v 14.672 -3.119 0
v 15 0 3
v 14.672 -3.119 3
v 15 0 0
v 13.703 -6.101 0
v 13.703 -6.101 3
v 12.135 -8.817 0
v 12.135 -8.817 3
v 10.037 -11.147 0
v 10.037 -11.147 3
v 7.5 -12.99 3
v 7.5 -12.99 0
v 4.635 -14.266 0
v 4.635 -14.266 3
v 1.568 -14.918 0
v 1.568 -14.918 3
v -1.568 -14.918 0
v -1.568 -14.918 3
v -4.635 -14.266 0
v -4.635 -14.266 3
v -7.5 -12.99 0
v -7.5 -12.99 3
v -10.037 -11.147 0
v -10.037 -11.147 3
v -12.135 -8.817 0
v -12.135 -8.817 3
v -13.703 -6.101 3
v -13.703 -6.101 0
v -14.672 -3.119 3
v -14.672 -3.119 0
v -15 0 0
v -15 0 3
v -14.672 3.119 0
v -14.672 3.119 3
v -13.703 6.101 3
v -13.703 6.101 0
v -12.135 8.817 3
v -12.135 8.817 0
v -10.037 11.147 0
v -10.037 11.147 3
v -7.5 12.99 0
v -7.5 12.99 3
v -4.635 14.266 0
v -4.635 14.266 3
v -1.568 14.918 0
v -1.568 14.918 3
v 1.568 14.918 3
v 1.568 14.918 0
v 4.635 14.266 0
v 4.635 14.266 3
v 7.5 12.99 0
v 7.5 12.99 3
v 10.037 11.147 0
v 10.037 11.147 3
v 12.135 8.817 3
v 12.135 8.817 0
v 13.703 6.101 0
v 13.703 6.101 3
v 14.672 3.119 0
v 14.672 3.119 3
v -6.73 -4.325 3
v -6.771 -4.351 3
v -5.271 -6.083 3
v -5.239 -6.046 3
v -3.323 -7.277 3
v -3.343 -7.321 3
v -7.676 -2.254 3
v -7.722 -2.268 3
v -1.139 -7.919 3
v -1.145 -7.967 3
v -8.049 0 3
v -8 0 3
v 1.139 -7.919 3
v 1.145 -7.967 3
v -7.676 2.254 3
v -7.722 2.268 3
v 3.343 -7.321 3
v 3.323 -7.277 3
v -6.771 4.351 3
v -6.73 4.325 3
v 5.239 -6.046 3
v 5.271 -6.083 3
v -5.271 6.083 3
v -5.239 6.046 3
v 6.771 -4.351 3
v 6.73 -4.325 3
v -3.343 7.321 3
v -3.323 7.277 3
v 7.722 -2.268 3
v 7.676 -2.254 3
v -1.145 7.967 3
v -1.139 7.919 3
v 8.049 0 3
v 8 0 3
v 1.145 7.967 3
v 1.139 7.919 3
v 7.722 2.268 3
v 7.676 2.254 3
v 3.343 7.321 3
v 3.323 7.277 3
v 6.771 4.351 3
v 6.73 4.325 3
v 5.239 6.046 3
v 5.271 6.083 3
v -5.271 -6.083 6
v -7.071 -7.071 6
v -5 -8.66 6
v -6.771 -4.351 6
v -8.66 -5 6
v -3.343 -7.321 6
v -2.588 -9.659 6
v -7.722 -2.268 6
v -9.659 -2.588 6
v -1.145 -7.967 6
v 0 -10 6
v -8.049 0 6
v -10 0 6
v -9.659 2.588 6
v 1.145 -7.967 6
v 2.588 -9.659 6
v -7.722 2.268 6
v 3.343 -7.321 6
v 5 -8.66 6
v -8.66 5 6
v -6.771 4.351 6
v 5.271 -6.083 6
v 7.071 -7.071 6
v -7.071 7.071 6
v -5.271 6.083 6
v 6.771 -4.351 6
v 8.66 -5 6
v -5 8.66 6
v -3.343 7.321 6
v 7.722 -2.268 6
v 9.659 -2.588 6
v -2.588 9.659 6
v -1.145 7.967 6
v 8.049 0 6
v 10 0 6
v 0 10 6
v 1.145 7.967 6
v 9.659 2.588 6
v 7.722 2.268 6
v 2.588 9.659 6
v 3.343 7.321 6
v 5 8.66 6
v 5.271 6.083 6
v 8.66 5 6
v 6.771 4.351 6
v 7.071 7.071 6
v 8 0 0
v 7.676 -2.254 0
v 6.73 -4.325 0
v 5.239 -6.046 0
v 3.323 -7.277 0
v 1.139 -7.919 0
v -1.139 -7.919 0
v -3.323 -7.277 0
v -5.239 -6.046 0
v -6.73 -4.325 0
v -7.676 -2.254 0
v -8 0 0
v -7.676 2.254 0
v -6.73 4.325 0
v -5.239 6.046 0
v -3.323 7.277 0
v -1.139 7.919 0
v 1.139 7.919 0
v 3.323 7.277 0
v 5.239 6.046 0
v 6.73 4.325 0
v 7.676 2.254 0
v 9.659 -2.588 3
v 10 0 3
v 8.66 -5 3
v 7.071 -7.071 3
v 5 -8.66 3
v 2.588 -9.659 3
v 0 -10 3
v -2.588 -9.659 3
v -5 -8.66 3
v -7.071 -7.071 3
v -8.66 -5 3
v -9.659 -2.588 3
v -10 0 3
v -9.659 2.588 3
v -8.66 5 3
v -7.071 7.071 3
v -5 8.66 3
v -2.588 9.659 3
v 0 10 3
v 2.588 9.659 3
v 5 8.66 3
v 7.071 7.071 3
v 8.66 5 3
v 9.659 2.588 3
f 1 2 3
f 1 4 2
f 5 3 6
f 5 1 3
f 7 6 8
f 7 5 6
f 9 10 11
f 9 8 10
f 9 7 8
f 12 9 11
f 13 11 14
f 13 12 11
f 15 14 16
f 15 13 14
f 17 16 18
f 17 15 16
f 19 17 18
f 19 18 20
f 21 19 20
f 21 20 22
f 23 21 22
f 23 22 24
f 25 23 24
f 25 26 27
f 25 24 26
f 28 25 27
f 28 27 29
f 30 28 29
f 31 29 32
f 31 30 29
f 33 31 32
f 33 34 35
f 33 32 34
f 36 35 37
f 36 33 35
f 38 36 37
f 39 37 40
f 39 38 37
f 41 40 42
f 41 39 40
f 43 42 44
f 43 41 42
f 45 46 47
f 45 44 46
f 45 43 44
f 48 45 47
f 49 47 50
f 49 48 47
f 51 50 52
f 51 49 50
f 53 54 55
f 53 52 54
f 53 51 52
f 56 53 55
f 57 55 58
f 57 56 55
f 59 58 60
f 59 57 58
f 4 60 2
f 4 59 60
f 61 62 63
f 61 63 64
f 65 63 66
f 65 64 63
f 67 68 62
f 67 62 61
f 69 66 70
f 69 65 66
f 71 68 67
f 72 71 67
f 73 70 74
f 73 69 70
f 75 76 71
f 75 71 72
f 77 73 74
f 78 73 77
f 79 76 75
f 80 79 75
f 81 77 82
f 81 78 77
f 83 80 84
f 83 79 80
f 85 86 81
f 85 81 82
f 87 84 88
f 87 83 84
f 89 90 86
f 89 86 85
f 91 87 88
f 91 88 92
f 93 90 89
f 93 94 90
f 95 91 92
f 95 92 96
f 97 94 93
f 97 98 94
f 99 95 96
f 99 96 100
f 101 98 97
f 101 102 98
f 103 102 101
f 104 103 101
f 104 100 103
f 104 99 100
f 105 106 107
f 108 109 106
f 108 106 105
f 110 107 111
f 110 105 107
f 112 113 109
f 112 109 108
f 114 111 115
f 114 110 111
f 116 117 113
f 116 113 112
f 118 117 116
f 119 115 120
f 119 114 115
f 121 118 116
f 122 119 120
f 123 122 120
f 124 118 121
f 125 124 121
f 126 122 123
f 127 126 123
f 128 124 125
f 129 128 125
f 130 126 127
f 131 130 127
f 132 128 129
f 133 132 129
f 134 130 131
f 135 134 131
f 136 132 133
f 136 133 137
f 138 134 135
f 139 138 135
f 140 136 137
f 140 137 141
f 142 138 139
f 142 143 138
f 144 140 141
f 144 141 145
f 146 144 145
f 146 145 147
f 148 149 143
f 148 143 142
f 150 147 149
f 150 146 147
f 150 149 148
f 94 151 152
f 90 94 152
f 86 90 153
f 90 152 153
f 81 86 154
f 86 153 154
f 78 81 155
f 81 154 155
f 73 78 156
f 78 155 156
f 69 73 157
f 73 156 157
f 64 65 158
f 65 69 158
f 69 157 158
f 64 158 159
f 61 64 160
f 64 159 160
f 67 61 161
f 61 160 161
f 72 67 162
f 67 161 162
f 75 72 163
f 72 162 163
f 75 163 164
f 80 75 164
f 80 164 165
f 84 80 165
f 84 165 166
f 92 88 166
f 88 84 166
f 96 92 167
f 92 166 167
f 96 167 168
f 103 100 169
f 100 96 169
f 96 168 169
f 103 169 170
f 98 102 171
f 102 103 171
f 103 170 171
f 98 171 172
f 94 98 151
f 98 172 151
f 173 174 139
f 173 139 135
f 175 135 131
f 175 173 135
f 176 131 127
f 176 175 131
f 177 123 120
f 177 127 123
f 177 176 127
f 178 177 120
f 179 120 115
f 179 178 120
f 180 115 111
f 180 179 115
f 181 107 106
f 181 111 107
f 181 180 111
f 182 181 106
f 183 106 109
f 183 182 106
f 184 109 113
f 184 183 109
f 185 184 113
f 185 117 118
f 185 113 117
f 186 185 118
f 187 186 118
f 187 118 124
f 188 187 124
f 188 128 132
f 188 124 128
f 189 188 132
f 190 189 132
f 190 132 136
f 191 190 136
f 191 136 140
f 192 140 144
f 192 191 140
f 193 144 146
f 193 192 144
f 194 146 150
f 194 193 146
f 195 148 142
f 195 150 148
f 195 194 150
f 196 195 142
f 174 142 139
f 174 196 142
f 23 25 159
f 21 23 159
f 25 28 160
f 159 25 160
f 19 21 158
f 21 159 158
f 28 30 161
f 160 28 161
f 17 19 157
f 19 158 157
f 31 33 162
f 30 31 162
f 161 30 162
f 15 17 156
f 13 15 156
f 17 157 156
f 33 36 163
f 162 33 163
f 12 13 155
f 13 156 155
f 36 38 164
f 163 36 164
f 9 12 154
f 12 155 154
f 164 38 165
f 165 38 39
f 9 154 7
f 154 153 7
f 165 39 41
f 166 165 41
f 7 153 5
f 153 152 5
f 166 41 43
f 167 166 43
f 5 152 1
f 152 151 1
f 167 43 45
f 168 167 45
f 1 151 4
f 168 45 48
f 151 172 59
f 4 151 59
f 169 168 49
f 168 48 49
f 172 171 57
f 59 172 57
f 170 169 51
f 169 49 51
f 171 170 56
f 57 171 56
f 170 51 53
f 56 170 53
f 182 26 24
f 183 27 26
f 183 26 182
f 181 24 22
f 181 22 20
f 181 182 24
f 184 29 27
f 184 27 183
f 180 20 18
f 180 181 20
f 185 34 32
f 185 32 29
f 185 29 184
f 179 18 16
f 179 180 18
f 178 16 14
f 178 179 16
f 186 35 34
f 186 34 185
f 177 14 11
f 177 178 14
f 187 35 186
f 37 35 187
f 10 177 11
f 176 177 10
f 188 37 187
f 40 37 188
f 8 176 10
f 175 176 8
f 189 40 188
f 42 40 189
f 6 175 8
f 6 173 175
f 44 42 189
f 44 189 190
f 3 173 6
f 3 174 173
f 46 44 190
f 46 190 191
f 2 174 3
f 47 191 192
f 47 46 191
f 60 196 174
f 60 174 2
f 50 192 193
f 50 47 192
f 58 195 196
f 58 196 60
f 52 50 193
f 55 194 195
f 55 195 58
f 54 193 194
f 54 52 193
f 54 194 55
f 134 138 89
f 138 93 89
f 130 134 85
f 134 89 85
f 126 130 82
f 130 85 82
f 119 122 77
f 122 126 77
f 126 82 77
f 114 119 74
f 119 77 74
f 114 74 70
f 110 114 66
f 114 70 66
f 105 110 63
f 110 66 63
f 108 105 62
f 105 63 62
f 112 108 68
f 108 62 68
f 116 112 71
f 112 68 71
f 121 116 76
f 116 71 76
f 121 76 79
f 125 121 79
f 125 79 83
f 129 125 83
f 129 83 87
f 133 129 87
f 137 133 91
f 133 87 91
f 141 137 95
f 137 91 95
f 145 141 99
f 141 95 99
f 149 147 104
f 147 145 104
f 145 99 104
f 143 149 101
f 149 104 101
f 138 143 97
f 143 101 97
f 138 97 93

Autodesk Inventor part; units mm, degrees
ref_plane "YZ Plane" through (0, 0, 0) normal (1, 0, 0) x (0, 1, 0)
ref_plane "XZ Plane" through (0, 0, 0) normal (0, 1, 0) x (-1, 0, 0)
ref_plane "XY Plane" through (0, 0, 0) normal (0, 0, 1) x (1, 0, 0)
sketch "Sketch1" plane through (0, 0, 0) normal (0, 0, 1) x (1, 0, 0)
  circle A0 centre (0, 0) radius 8
  circle A1 centre (0, 0) radius 15
  dimension "d0" = 16
  dimension "d1" = 30
extrude "Extrusion1" add sketch "Sketch1" along normal blind 3
sketch "Sketch2" plane through (0, 0, 3) normal (0, 0, 1) x (1, 0, 0)
  circle A0 centre (0, 0) radius 8.0485
  circle A1 centre (0, 0) radius 10
  dimension "d4" = 20
extrude "Extrusion2" add sketch "Sketch2" along normal blind 3
properties part number "bushing_1"
